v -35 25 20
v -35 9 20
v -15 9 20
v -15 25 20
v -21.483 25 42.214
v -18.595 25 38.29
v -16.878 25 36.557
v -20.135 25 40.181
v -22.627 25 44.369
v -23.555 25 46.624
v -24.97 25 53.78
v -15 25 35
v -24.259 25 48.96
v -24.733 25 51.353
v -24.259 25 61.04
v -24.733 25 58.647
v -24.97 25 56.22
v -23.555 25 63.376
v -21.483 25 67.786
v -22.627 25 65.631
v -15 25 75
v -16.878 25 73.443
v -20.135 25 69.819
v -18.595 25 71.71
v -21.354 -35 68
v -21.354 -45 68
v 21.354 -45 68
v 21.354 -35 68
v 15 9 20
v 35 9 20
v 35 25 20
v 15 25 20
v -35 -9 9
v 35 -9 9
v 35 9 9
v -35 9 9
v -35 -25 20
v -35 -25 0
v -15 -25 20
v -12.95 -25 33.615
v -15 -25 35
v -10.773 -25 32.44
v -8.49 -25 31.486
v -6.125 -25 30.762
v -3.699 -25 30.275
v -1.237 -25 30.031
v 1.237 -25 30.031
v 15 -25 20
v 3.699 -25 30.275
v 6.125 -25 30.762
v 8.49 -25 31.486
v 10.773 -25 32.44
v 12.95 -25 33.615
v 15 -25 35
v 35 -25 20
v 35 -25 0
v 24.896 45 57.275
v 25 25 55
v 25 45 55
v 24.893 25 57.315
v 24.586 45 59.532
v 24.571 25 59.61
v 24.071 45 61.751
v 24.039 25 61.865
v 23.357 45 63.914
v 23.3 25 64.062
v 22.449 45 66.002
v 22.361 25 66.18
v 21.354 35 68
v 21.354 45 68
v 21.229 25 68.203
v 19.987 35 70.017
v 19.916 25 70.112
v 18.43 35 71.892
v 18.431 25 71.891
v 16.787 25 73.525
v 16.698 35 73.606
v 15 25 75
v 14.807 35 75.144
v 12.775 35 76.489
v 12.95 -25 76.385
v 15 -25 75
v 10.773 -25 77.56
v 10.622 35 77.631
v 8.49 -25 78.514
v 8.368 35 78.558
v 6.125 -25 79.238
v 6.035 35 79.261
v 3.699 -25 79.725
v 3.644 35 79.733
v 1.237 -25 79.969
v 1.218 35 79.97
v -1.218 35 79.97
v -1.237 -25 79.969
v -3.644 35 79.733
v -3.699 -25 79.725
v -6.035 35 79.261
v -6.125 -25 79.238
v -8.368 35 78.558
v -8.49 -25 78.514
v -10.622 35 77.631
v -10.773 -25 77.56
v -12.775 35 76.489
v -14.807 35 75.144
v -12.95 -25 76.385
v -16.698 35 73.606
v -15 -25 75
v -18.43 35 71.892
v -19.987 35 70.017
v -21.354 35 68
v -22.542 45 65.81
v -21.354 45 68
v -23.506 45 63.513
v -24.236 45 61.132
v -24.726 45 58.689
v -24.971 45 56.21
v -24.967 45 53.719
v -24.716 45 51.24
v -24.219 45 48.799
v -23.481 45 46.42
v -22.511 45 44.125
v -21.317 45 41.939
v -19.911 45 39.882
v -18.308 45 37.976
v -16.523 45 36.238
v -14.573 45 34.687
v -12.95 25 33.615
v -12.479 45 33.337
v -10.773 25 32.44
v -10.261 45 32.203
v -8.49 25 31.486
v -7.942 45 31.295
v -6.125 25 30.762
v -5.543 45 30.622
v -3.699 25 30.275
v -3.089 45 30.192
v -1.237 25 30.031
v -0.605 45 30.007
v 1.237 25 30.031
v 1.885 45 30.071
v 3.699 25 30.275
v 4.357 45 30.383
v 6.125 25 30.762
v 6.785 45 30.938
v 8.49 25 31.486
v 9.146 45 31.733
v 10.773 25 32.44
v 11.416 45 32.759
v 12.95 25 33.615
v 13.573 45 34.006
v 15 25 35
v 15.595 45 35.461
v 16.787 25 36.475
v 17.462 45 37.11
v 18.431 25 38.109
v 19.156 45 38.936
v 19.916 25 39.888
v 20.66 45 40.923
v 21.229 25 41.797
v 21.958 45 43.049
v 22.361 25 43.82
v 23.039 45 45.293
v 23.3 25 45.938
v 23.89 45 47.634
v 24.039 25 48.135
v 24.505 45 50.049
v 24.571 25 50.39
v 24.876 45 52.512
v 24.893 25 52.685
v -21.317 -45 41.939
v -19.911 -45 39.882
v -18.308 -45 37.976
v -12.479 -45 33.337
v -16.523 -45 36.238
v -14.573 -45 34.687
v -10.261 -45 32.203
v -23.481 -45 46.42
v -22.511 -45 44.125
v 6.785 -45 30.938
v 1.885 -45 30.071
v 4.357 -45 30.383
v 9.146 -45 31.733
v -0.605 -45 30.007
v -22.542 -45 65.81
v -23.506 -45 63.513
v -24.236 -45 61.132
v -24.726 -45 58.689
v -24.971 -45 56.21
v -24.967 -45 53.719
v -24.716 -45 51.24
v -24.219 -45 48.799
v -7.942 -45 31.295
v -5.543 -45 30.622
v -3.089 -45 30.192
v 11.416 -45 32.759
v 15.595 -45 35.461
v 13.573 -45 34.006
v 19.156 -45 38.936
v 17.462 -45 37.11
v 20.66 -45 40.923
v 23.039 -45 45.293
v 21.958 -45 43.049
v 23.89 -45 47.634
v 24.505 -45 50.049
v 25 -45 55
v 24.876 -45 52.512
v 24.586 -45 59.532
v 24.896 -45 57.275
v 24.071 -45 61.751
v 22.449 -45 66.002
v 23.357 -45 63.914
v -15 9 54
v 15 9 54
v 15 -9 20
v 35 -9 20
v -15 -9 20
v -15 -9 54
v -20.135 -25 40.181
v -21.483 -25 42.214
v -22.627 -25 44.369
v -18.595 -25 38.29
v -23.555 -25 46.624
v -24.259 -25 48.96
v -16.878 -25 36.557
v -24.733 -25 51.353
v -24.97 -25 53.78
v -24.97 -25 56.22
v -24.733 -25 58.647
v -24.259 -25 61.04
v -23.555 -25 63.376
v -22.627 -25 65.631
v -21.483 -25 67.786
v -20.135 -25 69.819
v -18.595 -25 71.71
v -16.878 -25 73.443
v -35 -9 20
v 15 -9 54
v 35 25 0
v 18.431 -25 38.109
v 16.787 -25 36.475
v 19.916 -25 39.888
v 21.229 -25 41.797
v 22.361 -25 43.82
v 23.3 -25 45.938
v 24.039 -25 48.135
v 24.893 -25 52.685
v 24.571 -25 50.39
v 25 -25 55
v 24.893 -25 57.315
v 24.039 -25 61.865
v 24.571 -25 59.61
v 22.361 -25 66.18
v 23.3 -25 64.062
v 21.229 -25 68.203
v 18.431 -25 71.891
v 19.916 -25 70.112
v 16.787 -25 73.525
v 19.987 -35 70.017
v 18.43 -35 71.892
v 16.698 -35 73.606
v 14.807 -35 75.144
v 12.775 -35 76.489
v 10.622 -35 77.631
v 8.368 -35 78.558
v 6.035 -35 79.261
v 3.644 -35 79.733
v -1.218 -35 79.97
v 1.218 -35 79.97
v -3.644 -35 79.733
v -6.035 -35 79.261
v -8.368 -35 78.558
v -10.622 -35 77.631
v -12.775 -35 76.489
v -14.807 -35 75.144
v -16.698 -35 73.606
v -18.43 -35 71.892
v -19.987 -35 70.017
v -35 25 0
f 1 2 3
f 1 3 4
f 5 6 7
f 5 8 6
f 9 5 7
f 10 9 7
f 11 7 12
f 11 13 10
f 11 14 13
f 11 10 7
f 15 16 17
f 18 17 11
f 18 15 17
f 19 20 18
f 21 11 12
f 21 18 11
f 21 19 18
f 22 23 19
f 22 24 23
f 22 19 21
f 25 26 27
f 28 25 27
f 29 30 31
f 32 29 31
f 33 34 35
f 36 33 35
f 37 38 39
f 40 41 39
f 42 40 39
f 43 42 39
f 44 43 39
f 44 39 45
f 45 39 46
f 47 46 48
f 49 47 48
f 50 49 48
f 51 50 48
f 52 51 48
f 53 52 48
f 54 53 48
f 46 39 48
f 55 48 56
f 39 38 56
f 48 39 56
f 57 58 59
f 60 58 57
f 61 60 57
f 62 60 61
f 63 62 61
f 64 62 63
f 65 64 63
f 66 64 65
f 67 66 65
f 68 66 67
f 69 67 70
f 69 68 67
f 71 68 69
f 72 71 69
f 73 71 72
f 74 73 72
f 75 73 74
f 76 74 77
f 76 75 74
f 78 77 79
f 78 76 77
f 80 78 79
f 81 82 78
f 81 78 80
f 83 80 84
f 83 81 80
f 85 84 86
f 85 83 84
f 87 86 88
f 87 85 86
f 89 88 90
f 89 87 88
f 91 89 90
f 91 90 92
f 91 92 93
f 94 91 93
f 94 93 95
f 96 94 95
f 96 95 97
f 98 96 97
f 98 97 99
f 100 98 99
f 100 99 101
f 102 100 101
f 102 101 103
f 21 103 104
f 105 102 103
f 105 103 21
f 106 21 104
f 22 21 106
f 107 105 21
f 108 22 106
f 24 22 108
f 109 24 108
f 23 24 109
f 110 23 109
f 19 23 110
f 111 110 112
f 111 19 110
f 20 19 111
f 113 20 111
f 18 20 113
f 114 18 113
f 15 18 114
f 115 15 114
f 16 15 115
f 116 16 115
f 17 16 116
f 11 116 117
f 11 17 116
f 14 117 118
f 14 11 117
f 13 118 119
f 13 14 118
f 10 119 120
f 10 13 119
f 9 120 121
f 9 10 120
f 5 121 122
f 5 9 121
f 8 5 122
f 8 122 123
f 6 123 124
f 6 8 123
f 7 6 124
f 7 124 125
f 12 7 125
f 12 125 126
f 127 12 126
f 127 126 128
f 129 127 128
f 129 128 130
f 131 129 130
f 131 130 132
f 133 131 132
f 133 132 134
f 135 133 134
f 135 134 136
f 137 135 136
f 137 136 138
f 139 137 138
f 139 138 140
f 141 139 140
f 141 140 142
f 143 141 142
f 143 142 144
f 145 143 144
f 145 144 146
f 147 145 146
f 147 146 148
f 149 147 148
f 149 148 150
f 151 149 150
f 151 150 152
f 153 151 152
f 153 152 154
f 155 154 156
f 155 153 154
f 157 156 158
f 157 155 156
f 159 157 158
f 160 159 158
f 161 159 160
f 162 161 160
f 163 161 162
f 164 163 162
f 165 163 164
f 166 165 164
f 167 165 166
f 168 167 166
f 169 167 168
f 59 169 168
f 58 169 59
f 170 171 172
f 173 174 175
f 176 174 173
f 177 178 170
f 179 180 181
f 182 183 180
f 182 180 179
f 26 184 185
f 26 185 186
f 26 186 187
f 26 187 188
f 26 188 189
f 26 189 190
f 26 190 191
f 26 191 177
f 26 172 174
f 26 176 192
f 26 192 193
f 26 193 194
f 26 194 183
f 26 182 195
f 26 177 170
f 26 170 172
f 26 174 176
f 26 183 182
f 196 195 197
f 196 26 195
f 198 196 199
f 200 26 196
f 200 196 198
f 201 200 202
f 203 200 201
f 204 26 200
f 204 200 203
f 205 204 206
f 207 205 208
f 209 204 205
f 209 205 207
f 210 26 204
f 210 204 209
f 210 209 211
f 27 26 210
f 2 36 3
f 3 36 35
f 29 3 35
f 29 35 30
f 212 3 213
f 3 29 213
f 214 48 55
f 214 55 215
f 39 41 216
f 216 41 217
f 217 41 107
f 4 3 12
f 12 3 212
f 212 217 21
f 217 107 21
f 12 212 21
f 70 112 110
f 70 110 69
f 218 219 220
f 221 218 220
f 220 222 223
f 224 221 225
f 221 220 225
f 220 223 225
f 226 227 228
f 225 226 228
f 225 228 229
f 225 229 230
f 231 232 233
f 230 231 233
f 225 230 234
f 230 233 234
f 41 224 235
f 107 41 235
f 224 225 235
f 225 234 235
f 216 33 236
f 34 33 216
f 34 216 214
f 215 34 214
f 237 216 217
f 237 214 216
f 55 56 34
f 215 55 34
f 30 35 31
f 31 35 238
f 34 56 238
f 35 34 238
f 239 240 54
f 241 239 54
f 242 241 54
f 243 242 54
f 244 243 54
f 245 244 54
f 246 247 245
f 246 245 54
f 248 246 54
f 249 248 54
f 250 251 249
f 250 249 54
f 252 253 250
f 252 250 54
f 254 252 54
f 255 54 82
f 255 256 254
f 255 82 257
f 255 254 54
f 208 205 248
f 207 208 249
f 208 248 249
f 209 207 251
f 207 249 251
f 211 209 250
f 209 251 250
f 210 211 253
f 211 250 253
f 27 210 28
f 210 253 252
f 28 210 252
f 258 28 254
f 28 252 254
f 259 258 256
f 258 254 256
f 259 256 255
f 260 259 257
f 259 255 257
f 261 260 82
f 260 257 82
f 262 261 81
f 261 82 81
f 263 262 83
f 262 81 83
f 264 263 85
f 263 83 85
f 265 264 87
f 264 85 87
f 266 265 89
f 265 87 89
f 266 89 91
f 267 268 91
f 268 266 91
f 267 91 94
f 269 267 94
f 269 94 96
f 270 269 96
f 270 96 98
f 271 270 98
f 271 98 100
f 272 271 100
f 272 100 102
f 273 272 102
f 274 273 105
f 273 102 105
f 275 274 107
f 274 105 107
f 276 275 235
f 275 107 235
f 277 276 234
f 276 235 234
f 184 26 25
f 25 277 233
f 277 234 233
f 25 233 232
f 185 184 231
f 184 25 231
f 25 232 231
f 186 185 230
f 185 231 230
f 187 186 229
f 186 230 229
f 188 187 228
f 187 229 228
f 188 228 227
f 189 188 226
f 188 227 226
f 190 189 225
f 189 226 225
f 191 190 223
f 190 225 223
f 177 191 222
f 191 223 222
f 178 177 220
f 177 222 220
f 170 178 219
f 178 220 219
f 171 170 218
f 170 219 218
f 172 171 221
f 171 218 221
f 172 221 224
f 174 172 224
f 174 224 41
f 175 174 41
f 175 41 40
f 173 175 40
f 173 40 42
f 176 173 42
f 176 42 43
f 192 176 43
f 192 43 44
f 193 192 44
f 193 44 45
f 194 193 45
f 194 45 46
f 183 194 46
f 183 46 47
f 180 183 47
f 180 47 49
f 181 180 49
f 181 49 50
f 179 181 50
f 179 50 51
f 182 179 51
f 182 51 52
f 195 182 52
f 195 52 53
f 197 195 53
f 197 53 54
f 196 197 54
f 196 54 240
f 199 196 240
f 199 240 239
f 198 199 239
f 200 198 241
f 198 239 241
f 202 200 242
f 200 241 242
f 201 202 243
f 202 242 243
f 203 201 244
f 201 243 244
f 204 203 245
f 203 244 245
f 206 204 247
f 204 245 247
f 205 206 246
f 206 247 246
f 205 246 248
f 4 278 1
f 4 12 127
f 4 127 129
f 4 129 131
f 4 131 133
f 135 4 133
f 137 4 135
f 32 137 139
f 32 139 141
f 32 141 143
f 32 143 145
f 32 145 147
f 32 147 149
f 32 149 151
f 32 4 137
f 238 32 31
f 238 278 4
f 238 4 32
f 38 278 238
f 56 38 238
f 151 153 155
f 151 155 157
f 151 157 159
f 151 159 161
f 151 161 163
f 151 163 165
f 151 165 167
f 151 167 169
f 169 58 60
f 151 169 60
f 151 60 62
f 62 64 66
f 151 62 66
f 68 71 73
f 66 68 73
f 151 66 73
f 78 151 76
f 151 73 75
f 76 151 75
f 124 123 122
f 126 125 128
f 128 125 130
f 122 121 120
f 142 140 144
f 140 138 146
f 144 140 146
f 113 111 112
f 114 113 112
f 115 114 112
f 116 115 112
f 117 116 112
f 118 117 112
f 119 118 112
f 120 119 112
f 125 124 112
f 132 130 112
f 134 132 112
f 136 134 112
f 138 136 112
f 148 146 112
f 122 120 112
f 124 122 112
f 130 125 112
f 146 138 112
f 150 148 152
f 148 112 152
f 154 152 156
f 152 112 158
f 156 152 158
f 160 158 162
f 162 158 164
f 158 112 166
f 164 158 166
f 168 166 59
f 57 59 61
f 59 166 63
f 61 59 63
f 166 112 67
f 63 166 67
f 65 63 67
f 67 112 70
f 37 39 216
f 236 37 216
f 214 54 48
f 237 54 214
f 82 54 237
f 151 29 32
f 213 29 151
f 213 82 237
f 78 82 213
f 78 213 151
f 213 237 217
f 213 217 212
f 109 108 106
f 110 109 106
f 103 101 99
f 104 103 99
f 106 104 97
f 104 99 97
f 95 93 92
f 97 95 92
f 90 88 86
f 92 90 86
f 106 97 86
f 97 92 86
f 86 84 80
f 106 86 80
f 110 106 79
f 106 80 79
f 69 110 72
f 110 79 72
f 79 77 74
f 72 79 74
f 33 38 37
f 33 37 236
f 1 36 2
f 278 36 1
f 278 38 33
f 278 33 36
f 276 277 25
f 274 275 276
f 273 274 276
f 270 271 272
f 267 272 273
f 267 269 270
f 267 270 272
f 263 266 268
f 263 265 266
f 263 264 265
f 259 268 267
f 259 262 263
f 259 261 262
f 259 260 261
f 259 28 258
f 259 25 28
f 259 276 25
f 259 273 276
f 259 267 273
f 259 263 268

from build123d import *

# Parameters (mm, degrees)
F0_W          = 70
F0_H          = 50
F1_DEPTH      = 70
F2_R          = 25
F3_DEPTH      = 20
F3_DEPTH_BACK = 70
F4_W          = 18
F4_H          = 45
F5_DEPTH      = 70.001
F6_W          = 50
F6_H          = 20
F7_DEPTH      = 10
F8_W          = 50
F8_H          = 100
F9_DEPTH      = 20


# Not quite as in the source:
# - a pattern or mirror of a feature is missing from the dataset's text; its kind, count and spacing are read off the source's solid


with BuildPart() as f1:
    # F0 (on Top) → F1 (new body)
    with BuildSketch(Plane.XY):
        Rectangle(F0_W, F0_H)
    extrude(amount=F1_DEPTH)

    # F2 (on face) → F3 (join, two sides)
    with BuildSketch(Plane.XZ.offset(25)) as f3_sk:
        with Locations((0, 55)):
            Circle(F2_R)
    extrude(amount=F3_DEPTH)
    extrude(f3_sk.sketch, amount=-F3_DEPTH_BACK)

    # F4 (on face) → F5 (cut, through all)
    with BuildSketch(Plane.YZ.offset(35)):
        with Locations((0, 31.5)):
            Rectangle(F4_W, F4_H)
    extrude(amount=-F5_DEPTH, mode=Mode.SUBTRACT)

    # F6 (on face) → F7 (cut)
    with BuildSketch(Plane.XZ.offset(45)):
        with Locations((0, 78)):
            Rectangle(F6_W, F6_H)
    f7 = extrude(amount=-F7_DEPTH, mode=Mode.SUBTRACT)

    # F7_copies: F7 across plane
    add(f7.mirror(Plane.ZX), mode=Mode.SUBTRACT)

    # F8 (on face) → F9 (cut)
    with BuildSketch(Plane.YZ.offset(35)):
        with Locations((0, 70)):
            Rectangle(F8_W, F8_H)
    f9 = extrude(amount=-F9_DEPTH, mode=Mode.SUBTRACT)

    # F9_copies: F9 across plane
    add(f9.mirror(Plane(origin=(0, 0, 0), x_dir=(0, 0, -1), z_dir=(-1, 0, 0))), mode=Mode.SUBTRACT)


solid = f1.part
